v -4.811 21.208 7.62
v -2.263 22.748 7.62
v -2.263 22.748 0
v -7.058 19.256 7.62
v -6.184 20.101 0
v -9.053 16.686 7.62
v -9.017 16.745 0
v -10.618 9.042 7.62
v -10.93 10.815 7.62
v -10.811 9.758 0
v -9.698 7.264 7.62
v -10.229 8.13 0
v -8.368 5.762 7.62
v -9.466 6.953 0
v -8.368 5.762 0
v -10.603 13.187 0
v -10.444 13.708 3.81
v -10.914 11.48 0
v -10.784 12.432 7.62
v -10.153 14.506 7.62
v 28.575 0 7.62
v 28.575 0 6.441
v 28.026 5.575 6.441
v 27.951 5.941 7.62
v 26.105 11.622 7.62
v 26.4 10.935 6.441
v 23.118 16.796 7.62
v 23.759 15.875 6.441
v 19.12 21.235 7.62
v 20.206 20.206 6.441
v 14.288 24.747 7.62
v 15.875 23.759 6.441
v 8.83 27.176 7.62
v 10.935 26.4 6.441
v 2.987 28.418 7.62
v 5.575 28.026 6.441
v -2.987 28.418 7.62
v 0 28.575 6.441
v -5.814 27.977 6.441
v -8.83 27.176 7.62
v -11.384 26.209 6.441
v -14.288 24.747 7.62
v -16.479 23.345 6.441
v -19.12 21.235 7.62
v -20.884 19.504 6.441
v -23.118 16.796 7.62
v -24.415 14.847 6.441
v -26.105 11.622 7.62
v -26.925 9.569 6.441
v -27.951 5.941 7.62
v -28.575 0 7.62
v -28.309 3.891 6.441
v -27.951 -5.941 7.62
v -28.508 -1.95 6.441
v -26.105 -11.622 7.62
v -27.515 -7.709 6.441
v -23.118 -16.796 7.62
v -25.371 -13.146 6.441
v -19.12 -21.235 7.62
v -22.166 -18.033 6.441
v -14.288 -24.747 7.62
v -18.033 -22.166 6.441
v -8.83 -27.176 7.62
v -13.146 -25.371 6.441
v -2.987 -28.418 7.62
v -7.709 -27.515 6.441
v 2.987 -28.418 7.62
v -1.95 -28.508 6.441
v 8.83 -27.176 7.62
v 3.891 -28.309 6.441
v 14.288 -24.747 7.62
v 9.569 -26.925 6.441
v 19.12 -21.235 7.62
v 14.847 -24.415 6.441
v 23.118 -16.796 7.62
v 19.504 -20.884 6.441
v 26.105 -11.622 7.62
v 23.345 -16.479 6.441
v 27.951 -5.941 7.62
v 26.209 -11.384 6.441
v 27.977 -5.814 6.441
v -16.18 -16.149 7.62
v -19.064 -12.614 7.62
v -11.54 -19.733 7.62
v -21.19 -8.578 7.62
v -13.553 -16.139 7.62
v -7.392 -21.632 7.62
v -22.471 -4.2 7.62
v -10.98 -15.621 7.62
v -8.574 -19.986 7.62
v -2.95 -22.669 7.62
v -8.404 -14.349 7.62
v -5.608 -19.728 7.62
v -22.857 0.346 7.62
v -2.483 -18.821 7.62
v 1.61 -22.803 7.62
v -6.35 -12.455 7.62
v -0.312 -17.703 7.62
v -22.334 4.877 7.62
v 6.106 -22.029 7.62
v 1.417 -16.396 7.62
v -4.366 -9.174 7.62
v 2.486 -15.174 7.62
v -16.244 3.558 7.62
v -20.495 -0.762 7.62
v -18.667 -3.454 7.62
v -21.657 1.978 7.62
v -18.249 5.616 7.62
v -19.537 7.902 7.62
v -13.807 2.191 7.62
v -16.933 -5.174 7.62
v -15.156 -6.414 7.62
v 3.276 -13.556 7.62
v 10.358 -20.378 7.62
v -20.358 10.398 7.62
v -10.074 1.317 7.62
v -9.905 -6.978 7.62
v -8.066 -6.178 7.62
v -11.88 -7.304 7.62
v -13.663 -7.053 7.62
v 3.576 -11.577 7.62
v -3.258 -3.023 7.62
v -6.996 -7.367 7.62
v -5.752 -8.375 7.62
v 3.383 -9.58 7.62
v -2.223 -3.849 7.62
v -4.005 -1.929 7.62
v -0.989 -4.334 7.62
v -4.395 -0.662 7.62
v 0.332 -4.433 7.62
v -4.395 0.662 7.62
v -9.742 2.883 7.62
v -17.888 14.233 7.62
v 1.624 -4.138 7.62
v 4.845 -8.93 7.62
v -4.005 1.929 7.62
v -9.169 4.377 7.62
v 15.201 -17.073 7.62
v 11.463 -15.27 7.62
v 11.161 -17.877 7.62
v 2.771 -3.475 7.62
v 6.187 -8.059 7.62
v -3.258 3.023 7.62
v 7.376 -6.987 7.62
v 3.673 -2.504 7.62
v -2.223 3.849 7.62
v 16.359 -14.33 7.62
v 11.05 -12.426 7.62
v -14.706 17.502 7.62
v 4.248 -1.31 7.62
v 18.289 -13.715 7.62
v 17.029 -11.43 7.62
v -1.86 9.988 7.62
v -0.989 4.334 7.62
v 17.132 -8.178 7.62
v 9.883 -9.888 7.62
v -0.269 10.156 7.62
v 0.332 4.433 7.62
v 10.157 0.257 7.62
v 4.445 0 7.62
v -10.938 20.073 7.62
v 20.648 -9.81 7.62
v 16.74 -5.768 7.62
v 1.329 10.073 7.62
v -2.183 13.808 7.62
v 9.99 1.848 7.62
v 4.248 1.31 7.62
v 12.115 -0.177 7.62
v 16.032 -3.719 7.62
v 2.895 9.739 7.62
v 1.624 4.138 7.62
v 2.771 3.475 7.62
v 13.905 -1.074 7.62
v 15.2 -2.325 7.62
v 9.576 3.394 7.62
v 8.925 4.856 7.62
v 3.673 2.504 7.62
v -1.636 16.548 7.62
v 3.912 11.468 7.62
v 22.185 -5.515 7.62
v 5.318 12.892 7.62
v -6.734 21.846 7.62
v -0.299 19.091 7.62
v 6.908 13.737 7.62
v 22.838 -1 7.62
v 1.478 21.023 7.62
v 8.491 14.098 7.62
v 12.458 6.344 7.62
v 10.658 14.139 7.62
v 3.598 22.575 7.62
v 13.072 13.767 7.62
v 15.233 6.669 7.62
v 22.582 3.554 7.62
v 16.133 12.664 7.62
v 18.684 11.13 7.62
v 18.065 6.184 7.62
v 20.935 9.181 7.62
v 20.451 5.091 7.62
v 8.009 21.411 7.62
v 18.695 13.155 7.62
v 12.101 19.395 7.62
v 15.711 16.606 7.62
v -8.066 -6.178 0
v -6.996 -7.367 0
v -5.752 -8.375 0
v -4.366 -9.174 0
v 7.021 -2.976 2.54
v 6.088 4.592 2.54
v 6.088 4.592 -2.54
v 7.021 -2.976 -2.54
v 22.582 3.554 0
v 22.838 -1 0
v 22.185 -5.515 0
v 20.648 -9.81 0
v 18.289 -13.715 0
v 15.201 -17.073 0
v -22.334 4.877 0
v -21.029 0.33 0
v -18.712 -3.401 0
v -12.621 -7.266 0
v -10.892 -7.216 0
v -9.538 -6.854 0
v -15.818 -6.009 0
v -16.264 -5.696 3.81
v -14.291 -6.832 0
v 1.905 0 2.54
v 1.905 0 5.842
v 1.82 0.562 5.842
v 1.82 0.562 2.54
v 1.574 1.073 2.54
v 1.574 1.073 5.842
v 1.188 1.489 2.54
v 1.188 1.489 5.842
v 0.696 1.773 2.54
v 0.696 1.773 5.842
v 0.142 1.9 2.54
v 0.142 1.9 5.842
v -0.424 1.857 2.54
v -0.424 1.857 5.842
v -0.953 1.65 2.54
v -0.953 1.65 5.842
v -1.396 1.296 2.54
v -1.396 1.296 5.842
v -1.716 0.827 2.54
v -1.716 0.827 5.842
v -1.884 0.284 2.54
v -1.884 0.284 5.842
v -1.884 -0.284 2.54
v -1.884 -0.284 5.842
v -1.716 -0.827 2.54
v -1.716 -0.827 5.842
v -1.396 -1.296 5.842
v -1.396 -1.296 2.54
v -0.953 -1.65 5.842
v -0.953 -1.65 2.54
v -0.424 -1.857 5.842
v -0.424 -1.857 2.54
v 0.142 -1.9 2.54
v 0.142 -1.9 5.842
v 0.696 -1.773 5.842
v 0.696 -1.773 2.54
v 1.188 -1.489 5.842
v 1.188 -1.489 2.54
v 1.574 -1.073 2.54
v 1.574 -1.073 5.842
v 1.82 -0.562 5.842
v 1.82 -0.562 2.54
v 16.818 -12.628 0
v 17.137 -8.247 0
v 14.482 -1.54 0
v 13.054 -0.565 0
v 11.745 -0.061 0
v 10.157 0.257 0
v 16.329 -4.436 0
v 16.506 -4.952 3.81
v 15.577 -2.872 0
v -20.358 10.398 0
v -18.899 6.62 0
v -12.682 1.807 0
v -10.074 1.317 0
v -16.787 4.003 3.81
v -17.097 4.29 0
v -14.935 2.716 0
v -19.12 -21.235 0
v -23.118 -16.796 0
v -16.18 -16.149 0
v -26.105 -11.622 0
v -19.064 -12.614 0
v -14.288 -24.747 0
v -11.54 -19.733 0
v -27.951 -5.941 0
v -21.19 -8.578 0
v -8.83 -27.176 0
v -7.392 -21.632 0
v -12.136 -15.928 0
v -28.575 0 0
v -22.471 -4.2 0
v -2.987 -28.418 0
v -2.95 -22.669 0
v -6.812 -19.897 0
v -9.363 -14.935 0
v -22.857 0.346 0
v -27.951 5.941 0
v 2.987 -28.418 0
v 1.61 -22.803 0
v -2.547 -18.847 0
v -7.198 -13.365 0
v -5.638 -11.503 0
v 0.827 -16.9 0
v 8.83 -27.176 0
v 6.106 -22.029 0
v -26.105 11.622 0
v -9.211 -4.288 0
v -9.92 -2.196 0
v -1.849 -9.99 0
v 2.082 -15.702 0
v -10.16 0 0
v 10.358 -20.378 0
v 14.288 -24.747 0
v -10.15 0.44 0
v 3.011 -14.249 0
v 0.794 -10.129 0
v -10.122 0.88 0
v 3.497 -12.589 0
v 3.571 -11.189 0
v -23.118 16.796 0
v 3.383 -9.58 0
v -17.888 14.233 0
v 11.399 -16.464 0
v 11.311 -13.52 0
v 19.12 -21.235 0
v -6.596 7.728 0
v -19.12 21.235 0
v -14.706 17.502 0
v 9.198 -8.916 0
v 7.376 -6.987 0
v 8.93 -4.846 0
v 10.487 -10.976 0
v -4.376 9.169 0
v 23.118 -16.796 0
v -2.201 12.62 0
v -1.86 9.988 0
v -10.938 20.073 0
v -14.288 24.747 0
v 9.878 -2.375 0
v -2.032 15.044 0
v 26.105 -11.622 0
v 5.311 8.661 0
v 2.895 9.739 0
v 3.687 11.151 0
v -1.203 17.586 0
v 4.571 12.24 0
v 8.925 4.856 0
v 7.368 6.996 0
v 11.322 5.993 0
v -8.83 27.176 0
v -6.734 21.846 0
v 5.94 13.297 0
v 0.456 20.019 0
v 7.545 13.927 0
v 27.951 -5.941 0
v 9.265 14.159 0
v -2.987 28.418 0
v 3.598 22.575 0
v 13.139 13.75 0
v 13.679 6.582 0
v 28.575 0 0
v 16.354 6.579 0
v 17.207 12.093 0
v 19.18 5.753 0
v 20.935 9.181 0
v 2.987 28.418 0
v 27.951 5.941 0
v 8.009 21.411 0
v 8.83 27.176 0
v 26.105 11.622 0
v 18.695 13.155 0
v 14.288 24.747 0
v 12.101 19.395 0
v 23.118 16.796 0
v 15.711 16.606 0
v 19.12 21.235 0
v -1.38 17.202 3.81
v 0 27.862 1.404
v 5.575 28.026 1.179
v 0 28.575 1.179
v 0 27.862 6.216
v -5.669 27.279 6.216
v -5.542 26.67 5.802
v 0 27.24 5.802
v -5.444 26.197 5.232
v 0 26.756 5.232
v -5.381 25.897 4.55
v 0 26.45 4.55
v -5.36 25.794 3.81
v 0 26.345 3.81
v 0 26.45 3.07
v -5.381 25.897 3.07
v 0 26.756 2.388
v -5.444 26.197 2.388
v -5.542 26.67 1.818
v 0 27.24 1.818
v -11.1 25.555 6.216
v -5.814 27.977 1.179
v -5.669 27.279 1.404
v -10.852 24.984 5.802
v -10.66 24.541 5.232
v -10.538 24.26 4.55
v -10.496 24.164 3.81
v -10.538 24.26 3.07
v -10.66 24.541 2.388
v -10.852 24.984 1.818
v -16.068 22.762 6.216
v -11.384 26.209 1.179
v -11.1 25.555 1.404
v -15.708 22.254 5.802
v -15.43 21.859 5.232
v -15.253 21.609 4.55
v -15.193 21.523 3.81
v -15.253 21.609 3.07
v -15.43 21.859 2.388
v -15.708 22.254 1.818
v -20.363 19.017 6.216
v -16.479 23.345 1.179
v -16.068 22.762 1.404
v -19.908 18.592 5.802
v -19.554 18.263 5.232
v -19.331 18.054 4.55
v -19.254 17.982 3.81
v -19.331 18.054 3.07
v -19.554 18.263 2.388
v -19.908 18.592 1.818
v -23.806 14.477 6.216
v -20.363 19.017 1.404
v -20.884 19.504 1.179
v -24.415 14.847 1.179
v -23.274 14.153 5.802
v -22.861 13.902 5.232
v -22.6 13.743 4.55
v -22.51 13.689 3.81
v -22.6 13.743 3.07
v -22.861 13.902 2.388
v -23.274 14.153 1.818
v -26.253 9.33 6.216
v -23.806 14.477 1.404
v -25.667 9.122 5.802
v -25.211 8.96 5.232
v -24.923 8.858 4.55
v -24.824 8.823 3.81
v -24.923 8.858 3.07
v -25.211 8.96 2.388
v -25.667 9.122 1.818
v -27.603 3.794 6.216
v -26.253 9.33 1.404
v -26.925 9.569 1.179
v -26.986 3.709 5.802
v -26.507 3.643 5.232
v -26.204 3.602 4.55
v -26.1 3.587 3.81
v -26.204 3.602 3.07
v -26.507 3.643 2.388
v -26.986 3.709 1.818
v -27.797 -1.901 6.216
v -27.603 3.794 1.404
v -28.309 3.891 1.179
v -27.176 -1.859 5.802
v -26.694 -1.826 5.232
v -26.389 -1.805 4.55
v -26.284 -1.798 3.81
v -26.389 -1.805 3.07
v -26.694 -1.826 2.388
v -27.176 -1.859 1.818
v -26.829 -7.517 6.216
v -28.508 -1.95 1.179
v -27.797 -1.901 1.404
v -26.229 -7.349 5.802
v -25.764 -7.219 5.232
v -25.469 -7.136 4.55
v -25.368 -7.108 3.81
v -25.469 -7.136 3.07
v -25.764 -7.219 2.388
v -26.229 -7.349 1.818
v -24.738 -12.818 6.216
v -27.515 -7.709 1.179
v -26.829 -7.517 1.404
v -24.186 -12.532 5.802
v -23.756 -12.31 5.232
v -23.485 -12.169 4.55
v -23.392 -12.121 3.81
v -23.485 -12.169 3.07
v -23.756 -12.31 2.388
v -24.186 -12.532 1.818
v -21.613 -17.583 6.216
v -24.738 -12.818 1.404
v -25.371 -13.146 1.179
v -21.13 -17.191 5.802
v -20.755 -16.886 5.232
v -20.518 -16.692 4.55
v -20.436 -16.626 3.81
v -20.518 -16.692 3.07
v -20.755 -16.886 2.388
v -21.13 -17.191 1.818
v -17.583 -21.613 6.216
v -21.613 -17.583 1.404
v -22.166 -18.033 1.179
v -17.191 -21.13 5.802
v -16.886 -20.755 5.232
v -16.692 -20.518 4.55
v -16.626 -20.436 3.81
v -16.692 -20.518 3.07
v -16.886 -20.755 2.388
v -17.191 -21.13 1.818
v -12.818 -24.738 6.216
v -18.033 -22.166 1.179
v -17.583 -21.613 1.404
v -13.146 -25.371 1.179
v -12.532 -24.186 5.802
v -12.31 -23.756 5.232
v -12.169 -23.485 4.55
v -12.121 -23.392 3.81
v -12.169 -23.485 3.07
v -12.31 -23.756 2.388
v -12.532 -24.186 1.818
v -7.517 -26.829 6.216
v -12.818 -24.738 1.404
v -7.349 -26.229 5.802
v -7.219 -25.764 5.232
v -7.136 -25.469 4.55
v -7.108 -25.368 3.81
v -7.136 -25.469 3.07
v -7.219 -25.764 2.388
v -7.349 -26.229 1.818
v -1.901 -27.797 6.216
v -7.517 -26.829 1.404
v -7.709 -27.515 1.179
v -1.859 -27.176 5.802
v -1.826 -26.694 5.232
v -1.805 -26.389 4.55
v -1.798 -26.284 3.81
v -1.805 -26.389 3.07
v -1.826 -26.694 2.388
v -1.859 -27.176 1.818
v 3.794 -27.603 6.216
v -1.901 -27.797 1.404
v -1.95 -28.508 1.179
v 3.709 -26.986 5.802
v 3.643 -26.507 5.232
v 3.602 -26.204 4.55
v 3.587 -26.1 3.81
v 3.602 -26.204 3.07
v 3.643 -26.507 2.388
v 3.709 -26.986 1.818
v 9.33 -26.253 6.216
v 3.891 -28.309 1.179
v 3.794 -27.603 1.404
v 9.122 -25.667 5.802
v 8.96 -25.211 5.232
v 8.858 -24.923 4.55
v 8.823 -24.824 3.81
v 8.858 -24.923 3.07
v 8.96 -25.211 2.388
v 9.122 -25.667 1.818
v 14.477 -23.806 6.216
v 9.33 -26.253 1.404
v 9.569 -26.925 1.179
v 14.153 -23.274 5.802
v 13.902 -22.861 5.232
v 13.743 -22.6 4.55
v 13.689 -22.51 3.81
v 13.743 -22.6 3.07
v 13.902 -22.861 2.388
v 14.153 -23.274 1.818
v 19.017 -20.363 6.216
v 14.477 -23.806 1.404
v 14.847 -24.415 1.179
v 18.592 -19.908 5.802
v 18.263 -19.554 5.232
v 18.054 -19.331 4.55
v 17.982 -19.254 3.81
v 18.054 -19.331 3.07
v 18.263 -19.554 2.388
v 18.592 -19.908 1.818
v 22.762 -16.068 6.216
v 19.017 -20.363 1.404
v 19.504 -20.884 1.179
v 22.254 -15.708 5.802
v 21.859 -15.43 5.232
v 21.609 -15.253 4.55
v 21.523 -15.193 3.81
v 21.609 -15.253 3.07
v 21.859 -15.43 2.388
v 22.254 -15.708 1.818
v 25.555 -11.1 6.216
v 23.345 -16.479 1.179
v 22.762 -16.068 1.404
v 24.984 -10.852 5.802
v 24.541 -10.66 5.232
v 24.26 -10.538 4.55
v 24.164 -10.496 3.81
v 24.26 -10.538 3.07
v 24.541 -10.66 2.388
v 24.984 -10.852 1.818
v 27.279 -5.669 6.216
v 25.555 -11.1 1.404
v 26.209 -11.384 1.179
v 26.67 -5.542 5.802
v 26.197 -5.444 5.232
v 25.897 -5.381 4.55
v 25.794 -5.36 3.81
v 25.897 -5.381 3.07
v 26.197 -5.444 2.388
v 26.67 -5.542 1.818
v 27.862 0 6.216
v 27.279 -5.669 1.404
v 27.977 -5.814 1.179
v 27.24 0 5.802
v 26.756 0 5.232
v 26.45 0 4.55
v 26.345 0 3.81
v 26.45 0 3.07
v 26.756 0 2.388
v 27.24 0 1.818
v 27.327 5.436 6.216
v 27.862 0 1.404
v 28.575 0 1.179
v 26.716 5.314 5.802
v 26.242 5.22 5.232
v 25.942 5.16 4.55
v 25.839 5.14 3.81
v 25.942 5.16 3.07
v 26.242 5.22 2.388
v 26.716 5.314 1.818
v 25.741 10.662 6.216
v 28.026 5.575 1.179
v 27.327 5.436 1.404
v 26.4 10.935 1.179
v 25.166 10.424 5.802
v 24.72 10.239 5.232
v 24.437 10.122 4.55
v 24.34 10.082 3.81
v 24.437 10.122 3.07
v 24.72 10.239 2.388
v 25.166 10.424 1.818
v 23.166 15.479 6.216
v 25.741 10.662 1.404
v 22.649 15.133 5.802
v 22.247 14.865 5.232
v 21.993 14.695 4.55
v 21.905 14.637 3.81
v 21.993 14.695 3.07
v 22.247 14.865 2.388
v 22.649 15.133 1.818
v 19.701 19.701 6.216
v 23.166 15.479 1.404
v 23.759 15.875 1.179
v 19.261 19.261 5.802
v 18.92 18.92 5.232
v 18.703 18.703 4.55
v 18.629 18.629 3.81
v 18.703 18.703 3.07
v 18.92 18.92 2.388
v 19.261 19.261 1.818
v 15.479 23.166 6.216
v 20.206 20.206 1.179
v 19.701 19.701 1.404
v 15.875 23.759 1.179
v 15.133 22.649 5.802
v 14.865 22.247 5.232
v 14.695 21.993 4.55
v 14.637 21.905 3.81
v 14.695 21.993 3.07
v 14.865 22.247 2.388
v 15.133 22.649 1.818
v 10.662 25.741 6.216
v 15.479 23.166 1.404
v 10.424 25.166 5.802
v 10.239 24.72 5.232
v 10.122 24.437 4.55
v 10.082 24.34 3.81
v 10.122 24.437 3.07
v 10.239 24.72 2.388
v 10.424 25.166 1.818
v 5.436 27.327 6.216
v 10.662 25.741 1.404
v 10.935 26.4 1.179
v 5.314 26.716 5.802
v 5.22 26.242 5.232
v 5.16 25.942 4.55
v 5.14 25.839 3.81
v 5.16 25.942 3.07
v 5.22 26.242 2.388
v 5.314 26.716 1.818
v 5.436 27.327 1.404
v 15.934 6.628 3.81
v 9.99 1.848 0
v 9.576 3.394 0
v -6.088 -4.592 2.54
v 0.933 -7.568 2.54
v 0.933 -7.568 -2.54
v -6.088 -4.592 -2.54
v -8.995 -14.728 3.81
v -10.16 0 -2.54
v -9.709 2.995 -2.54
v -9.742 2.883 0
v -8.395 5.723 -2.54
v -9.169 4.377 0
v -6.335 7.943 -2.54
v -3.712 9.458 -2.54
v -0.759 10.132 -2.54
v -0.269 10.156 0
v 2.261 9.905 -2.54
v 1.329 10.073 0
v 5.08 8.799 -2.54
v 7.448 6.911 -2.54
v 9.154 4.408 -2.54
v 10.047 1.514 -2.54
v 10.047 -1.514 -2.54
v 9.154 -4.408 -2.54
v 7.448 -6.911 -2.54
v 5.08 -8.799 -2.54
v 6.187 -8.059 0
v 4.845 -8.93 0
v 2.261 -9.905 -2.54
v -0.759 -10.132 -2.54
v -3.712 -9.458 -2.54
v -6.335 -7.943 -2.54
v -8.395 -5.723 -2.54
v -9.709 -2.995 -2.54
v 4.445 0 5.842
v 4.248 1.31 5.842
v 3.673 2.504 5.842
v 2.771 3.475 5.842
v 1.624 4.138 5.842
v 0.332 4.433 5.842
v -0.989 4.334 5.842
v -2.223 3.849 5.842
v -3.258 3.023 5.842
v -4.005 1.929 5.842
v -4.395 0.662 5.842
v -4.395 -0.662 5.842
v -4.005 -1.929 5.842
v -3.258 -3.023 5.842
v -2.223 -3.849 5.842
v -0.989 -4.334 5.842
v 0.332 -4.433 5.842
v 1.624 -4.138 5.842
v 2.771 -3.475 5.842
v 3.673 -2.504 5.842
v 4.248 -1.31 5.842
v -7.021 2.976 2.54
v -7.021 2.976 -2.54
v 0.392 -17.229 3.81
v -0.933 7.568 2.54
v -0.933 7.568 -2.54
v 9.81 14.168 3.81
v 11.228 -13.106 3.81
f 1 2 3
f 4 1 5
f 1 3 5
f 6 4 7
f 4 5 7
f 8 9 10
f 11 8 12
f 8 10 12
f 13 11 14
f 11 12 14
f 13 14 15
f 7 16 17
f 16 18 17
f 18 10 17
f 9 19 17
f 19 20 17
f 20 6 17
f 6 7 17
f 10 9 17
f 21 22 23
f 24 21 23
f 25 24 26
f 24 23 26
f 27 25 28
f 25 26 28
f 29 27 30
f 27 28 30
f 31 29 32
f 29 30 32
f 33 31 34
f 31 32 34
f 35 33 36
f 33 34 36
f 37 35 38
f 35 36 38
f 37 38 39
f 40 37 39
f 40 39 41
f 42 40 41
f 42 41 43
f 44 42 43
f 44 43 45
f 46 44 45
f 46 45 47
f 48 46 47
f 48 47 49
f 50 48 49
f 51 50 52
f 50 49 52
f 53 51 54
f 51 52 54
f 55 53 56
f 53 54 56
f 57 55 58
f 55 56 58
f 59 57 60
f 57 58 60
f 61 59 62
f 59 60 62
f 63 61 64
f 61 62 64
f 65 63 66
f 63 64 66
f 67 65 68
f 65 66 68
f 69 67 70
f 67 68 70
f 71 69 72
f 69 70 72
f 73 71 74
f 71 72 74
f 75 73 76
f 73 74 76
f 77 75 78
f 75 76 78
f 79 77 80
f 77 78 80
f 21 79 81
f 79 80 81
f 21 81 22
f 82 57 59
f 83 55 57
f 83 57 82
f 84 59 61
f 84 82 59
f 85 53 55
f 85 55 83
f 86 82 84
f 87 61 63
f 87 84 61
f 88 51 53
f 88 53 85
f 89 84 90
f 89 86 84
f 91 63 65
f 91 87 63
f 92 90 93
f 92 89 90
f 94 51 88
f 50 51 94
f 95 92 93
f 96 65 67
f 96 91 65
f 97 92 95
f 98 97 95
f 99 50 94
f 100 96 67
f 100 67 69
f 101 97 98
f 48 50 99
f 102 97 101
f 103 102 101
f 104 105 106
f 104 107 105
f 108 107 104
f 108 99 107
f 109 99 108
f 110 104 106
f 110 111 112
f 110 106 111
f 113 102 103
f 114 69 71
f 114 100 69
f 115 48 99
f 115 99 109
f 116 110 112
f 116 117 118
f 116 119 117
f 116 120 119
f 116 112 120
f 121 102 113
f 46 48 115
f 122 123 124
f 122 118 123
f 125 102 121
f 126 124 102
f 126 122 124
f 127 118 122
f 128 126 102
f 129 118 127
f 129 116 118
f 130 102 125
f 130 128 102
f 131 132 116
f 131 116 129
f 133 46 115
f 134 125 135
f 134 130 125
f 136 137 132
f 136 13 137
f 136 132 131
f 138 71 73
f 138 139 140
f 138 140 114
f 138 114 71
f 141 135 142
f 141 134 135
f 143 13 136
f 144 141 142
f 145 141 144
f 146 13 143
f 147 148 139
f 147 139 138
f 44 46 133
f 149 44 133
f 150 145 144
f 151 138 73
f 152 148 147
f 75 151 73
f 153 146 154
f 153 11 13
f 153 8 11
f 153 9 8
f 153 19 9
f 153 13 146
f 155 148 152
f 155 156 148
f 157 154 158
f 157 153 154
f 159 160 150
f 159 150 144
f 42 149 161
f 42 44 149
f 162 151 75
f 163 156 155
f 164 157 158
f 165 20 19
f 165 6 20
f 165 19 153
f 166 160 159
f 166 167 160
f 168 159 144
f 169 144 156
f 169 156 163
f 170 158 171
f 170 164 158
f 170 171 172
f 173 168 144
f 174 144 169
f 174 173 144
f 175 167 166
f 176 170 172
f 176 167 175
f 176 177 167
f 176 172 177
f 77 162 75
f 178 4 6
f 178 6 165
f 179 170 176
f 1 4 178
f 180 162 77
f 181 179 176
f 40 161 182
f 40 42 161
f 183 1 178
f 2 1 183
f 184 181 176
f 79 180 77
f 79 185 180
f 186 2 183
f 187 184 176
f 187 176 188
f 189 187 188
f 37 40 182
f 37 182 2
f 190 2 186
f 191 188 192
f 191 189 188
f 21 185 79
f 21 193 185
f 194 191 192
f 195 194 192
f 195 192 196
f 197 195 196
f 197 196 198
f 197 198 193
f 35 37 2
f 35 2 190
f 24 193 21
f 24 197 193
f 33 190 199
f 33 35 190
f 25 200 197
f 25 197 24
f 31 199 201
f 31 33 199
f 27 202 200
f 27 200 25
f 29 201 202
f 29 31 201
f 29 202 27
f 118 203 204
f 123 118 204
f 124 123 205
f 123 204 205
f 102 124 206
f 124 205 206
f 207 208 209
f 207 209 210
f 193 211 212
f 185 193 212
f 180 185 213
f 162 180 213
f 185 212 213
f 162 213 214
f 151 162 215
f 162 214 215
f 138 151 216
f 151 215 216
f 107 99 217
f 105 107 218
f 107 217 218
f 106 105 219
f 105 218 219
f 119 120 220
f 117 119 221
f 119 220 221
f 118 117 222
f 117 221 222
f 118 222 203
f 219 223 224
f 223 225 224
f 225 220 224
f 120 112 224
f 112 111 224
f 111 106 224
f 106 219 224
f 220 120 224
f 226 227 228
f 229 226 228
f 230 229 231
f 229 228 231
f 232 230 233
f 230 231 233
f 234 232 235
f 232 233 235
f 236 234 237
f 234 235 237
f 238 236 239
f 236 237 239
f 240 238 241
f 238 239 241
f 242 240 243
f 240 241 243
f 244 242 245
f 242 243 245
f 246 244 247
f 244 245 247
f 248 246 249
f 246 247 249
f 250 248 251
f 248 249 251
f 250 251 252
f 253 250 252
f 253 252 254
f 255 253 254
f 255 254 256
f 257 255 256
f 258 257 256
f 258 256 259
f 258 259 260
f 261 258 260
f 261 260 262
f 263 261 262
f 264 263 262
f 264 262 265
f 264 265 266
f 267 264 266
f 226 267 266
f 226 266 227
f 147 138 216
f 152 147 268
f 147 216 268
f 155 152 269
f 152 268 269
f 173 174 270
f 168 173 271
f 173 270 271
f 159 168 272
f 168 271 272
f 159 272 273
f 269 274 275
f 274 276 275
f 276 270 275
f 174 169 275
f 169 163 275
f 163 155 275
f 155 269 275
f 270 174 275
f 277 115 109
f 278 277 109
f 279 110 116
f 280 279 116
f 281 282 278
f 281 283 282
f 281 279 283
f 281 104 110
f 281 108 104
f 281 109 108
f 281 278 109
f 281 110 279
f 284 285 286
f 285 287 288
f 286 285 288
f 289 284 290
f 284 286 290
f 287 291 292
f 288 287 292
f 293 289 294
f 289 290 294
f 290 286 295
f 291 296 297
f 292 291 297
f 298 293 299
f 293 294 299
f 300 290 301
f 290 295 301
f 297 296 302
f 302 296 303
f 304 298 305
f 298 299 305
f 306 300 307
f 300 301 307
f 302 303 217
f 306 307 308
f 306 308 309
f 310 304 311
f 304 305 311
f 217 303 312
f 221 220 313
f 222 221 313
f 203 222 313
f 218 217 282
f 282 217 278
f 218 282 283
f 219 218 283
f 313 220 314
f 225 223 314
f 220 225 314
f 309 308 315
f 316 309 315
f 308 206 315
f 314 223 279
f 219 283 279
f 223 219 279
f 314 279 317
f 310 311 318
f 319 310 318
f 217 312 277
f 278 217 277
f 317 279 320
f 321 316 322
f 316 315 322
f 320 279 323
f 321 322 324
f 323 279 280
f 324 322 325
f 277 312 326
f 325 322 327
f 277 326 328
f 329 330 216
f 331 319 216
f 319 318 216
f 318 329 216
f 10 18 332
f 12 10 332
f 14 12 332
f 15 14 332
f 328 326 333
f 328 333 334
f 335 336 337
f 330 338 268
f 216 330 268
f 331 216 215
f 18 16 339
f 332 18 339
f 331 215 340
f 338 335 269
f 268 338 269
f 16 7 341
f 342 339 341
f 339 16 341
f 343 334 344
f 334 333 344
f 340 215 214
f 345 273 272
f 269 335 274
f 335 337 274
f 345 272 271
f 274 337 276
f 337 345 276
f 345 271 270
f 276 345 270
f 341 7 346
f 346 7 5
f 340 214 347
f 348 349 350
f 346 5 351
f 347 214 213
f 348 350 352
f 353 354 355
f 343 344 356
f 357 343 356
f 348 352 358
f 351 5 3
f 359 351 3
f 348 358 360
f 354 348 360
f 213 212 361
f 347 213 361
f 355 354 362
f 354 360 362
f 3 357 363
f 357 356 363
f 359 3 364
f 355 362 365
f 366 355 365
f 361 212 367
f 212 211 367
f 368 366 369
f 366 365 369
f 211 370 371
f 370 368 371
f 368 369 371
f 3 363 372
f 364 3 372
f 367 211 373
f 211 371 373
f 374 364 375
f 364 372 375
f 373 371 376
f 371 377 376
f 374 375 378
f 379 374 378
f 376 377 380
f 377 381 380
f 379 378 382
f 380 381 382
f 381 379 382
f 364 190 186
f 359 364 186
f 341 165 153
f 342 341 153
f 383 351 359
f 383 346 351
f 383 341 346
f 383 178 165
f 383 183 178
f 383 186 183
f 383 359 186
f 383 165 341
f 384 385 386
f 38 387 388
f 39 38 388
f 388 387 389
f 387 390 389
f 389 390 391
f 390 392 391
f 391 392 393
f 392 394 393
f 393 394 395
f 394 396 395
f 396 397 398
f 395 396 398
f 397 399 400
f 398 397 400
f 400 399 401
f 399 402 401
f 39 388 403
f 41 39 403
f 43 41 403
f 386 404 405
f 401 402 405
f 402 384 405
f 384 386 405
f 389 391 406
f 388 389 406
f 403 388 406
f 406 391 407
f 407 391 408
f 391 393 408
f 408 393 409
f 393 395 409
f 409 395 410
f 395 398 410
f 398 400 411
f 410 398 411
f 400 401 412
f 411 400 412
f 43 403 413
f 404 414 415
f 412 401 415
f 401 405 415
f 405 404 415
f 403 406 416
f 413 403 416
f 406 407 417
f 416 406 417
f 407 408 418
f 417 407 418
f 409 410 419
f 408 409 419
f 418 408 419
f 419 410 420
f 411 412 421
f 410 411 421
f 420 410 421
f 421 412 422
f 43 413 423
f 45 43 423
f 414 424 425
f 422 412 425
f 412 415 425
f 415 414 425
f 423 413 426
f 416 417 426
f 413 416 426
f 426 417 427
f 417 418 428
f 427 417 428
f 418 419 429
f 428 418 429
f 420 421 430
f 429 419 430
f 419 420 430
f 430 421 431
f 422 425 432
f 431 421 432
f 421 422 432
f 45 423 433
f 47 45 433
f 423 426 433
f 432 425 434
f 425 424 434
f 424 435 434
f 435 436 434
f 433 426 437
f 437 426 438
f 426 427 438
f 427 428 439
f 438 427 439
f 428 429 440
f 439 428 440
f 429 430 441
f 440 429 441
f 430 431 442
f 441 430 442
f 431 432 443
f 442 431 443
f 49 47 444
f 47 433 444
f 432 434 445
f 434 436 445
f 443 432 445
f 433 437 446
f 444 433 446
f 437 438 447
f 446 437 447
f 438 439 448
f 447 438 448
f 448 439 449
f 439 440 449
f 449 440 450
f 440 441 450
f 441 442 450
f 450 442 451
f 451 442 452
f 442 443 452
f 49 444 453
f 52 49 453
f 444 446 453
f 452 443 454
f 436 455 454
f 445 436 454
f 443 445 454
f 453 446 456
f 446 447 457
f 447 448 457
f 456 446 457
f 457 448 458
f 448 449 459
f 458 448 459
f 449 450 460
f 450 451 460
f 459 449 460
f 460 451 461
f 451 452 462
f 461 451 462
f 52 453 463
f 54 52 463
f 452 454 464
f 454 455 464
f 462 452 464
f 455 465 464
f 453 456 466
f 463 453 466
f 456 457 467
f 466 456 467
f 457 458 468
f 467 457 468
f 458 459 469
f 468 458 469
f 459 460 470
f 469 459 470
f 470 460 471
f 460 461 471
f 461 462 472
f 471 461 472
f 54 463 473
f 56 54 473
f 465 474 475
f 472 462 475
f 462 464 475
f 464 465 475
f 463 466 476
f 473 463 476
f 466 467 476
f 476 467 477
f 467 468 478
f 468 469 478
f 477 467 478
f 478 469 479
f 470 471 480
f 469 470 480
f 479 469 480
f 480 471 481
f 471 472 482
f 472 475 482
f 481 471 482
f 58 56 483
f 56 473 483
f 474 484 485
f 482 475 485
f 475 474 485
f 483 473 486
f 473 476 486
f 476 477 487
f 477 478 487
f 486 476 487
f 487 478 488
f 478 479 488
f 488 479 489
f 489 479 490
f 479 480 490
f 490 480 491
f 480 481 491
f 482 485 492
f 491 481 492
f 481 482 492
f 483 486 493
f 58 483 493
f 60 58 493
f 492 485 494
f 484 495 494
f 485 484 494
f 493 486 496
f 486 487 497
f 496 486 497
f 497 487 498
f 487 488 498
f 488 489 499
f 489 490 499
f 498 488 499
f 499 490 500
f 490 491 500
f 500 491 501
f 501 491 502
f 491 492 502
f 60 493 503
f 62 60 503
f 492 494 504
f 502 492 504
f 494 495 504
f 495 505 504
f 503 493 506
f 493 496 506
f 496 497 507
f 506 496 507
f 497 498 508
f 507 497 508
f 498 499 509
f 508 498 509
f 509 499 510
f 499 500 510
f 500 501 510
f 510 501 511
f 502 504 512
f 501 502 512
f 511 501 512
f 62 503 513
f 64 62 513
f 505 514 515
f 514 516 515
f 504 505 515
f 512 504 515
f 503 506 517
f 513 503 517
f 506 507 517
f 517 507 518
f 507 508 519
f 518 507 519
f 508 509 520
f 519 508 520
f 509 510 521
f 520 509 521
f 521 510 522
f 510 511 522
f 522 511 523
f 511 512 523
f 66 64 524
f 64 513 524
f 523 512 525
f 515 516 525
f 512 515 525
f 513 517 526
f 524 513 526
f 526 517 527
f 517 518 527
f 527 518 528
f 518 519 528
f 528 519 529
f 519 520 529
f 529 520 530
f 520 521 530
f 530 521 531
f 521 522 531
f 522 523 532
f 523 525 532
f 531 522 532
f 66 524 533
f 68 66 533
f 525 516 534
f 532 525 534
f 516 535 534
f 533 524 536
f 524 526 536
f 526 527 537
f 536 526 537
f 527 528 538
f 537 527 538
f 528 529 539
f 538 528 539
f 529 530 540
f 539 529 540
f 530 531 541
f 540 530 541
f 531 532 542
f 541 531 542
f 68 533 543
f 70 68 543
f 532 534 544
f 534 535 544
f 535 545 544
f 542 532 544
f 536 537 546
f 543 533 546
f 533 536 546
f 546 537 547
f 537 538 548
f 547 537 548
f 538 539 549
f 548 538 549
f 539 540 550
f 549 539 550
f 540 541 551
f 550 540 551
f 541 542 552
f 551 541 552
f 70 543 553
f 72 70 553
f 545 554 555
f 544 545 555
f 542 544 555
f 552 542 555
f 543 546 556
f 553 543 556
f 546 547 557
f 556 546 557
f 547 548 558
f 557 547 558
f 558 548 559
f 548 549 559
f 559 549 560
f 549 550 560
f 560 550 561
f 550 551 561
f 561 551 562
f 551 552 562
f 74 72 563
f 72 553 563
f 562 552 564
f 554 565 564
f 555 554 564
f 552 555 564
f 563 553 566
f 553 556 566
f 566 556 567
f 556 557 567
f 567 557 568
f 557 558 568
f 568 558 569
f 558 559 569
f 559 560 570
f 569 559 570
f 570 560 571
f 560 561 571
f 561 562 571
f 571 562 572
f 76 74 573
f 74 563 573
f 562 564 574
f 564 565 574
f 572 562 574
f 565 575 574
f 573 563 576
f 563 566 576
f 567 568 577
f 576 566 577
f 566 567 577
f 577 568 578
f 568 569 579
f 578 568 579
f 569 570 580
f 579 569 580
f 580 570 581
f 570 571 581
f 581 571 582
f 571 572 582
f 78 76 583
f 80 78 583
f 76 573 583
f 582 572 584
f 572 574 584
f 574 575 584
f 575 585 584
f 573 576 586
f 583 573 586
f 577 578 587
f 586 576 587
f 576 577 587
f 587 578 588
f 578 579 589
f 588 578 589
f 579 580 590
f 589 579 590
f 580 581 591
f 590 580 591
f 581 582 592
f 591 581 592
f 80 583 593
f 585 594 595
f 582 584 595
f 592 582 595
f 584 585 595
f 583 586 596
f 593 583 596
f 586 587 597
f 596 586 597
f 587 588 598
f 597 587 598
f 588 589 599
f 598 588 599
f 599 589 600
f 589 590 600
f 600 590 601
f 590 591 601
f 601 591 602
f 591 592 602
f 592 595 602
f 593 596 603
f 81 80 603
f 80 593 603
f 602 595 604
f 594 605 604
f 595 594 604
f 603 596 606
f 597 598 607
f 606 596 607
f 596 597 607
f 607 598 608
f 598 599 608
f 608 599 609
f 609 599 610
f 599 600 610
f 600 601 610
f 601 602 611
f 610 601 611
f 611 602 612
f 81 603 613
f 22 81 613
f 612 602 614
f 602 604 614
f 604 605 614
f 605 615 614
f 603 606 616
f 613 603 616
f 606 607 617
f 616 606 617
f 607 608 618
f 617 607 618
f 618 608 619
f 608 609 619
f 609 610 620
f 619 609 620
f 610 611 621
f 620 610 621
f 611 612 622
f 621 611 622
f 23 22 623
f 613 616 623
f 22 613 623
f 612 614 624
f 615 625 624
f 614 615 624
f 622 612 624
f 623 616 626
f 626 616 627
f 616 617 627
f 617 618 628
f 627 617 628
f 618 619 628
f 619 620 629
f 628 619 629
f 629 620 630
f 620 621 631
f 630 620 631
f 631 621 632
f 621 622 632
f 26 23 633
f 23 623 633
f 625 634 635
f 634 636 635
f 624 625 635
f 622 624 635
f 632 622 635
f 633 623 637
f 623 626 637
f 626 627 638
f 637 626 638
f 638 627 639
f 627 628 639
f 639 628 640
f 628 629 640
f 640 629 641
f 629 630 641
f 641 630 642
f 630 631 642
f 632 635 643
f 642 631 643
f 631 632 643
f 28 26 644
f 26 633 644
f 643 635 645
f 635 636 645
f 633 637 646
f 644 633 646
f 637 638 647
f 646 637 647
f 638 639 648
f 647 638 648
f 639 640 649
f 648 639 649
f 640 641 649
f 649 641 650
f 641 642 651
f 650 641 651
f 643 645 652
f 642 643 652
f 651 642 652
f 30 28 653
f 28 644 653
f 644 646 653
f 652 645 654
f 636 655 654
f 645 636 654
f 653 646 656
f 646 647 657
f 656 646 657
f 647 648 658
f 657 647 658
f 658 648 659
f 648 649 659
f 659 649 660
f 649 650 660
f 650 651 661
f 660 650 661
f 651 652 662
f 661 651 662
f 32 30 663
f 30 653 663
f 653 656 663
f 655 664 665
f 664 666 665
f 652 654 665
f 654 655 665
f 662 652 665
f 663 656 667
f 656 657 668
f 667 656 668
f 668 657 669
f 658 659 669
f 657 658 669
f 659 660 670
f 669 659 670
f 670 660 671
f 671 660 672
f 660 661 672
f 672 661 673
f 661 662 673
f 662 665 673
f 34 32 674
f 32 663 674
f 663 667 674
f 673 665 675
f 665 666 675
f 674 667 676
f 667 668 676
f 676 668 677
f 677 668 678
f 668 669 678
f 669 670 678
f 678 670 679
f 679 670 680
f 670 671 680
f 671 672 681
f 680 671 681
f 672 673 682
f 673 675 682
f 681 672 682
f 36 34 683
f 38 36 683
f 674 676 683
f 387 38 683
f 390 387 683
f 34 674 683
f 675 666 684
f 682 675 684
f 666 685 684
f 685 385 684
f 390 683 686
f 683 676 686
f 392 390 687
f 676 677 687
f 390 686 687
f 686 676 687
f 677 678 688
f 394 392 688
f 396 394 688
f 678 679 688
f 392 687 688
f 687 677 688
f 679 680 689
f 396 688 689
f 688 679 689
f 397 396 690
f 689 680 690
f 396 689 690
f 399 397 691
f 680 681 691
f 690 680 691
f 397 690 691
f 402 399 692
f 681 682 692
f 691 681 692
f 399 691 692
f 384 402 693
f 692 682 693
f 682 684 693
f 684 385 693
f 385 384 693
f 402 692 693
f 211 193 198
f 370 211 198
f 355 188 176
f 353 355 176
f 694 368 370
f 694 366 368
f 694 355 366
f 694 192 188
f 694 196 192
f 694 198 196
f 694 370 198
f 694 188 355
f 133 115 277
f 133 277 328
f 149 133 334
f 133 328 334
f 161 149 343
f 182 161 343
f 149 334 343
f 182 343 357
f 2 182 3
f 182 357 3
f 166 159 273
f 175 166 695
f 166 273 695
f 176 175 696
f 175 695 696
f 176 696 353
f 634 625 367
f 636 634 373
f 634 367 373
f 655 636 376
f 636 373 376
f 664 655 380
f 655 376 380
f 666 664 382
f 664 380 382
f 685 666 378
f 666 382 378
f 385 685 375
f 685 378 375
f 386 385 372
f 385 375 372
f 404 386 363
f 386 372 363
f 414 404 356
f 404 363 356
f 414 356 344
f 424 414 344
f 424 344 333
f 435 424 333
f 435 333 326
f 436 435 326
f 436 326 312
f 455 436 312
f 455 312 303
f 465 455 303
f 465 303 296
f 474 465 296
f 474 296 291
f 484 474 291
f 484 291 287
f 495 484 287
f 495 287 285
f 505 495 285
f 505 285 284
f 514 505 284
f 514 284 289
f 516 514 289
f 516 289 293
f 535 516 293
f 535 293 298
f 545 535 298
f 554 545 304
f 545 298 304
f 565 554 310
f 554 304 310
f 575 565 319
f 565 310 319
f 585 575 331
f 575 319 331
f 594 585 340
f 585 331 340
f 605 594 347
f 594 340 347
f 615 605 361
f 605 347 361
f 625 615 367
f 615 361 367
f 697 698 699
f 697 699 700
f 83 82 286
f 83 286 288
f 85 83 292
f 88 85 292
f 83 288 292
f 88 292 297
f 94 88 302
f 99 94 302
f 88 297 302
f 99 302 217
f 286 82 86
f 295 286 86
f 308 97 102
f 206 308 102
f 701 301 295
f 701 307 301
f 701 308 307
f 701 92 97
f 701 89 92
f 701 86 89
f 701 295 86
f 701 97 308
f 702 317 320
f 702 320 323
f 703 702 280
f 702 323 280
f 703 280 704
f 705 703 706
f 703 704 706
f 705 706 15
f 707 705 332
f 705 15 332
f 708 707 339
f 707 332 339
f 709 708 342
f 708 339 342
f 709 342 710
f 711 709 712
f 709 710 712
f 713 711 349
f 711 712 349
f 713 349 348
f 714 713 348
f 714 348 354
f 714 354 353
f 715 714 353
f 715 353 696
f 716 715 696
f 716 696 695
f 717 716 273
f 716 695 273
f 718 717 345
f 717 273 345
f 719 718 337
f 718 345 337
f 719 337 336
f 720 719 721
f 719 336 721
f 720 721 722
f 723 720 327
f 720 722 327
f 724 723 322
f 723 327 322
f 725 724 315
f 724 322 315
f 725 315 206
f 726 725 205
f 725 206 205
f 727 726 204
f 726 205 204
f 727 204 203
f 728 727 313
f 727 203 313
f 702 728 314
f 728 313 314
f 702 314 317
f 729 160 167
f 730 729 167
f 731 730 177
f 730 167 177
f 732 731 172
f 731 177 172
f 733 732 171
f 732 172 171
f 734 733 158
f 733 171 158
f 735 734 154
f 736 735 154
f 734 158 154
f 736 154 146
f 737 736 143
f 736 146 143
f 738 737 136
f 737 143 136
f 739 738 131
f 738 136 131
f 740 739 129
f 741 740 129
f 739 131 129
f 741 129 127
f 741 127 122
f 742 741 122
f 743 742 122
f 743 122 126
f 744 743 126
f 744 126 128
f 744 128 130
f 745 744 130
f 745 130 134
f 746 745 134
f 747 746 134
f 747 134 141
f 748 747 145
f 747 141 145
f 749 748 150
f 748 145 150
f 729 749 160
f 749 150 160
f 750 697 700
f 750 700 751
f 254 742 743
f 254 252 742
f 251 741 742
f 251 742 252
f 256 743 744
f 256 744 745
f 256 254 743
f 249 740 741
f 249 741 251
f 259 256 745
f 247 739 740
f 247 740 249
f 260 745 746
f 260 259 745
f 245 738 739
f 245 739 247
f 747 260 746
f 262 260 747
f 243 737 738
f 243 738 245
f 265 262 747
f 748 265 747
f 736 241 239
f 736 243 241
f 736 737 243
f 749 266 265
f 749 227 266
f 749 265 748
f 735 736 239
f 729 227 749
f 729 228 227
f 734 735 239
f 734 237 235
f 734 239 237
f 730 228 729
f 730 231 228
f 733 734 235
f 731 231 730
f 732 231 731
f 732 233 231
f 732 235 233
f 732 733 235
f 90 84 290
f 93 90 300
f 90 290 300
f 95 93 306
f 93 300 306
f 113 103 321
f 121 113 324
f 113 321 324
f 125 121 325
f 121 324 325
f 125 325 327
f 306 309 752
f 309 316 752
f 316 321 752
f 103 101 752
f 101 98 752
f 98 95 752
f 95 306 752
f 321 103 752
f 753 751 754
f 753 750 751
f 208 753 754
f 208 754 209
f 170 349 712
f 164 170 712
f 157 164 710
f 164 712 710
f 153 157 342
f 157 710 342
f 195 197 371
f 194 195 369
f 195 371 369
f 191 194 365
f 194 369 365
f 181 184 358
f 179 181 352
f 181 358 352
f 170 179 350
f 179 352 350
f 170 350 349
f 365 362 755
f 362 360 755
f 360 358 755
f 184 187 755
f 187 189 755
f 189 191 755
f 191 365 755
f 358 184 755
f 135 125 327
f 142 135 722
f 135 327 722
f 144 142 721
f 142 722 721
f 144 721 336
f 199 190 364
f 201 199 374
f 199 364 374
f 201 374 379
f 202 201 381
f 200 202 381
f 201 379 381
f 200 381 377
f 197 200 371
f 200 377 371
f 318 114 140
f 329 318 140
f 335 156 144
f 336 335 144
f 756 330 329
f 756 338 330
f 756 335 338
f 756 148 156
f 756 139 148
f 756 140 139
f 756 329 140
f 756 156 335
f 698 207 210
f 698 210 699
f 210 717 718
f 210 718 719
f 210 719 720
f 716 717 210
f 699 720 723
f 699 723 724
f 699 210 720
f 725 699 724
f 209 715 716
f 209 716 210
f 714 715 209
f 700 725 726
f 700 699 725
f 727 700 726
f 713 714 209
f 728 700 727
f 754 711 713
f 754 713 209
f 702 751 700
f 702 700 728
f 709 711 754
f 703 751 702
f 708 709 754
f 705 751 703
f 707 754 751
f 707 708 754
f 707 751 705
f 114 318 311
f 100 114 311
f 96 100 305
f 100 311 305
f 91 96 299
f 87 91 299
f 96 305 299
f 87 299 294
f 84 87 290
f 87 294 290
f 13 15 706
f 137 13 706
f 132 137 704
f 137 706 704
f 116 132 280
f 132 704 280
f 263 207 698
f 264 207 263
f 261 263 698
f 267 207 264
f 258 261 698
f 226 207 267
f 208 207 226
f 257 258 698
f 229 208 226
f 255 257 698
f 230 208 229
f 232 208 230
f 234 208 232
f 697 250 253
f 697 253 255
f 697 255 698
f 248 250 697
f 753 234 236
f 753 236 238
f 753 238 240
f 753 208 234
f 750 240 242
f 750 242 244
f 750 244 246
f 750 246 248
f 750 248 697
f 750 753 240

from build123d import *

# Parameters (mm, degrees)
SKETCH1_R               = 28.575
BOSS_EXTRUDE1_DEPTH     = 7.62
SKETCH3_R               = 2.667
SKETCH5_R               = 10.16
BOSS_EXTRUDE3_DEPTH     = 2.54
CUT_EXTRUDE1_DEPTH      = 2.54
CUT_EXTRUDE1_DEPTH_BACK = 2.54
SKETCH6_R               = 1.905
CUT_EXTRUDE2_DEPTH      = 11.16
CUT_EXTRUDE3_DEPTH      = 8.62
SKETCH8_R               = 4.445
CUT_EXTRUDE4_DEPTH      = 1.778


with BuildPart() as part:
    # Sketch1 → Boss-Extrude1 (new body)
    with BuildSketch(Plane.XY):
        Circle(SKETCH1_R)
    extrude(amount=BOSS_EXTRUDE1_DEPTH)

    # Sketch3 → Cut-Revolve1 (revolve, cut)
    with BuildSketch(Plane(origin=(0, 0, 0), x_dir=(0, 0, -1), z_dir=(1, 0, 0))):
        with Locations((-3.81, 29.012456481)):
            Circle(SKETCH3_R)
    revolve(axis=Axis((0, 0, 0), (0, 0, 1)), mode=Mode.SUBTRACT)

    # Sketch5 → Boss-Extrude3 (add)
    with BuildSketch(Plane(origin=(0, 0, 0), x_dir=(-1, 0, 0), z_dir=(0, 0, -1))):
        Circle(SKETCH5_R)
    extrude(amount=BOSS_EXTRUDE3_DEPTH)

    # Sketch4 → Cut-Extrude1 (cut, two sides)
    with BuildSketch(Plane(origin=(0, 0, 0), x_dir=(-1, 0, 0), z_dir=(0, 0, -1))) as cut_extrude1_sk:
        Polygon((7.020938099, 2.976045958), (0.933137647, 7.568333731), (-6.087800452, 4.592287773), (-7.020938099, -2.976045958), (-0.933137647, -7.568333731), (6.087800452, -4.592287773), align=None)
    extrude(amount=CUT_EXTRUDE1_DEPTH, mode=Mode.SUBTRACT)
    extrude(cut_extrude1_sk.sketch, amount=-CUT_EXTRUDE1_DEPTH_BACK, mode=Mode.SUBTRACT)

    # Sketch6 → Cut-Extrude2 (cut, through all)
    with BuildSketch(Plane.XY.offset(7.62)):
        Circle(SKETCH6_R)
    extrude(amount=-CUT_EXTRUDE2_DEPTH, mode=Mode.SUBTRACT)

    # Sketch7 → Cut-Extrude3 (cut, through all)
    with BuildSketch(Plane(origin=(0, 0, 0), x_dir=(-1, 0, 0), z_dir=(0, 0, -1))):
        with BuildLine():
            ThreePointArc((20.358331305, 10.397977999), (12.886311534, 18.881805397), (2.2627084, 22.747741661))
            add(Edge.make_bspline(
                [(2.2627084, 22.747741661), (6.405747391, 20.68512775), (11.177081783, 15.102097432), (11.330348043, 8.533524003), (8.367773099, 5.762462439)],
                knots=[0, 0, 0, 0, 0.593726926, 1, 1, 1, 1], degree=3))
            ThreePointArc((8.367773099, 5.762462439), (9.485052986, 3.641341765), (10.074217449, 1.317475913))
            add(Edge.make_bspline(
                [(20.358331305, 10.397977999), (18.357588554, 2.14920895), (10.074217449, 1.317475913)],
                knots=[0, 0, 0, 1, 1, 1], degree=2))
        make_face()
        with BuildLine():
            ThreePointArc((16.180135083, -16.14877174), (21.939753321, -6.420811804), (22.333603287, 4.877475189))
            add(Edge.make_bspline(
                [(22.333603287, 4.877475189), (21.652210342, 0.299828208), (17.81685639, -5.963231706), (11.617133708, -8.1387974), (8.066211545, -6.17752631)],
                knots=[0, 0, 0, 0, 0.593726926, 1, 1, 1, 1], degree=3))
            ThreePointArc((8.066211545, -6.17752631), (6.394164379, -7.895584962), (4.366098449, -9.174027705))
            add(Edge.make_bspline(
                [(16.180135083, -16.14877174), (7.716826016, -16.794962128), (4.366098449, -9.174027705)],
                knots=[0, 0, 0, 1, 1, 1], degree=2))
        make_face()
        with BuildLine():
            ThreePointArc((-10.358457881, -20.378467811), (0.673201723, -22.850085327), (11.540217523, -19.733296216))
            add(Edge.make_bspline(
                [(11.540217523, -19.733296216), (6.976054533, -20.499823727), (-0.165658961, -18.787577309), (-4.15056456, -13.563577423), (-3.382580204, -9.580383665)],
                knots=[0, 0, 0, 0, 0.593726926, 1, 1, 1, 1], degree=3))
            ThreePointArc((-3.382580204, -9.580383665), (-5.533242071, -8.521081633), (-7.37582021, -6.987336849))
            add(Edge.make_bspline(
                [(-10.358457881, -20.378467811), (-13.588327791, -12.529066385), (-7.37582021, -6.987336849)],
                knots=[0, 0, 0, 1, 1, 1], degree=2))
        make_face()
        with BuildLine():
            ThreePointArc((-22.582014125, 3.554185994), (-21.523691775, -7.701317574), (-15.201356621, -17.07332296))
            add(Edge.make_bspline(
                [(-15.201356621, -17.07332296), (-17.340771534, -12.969416034), (-17.919239259, -5.648129637), (-14.182323678, -0.243954457), (-10.156761081, 0.25652358)],
                knots=[0, 0, 0, 0, 0.593726926, 1, 1, 1, 1], degree=3))
            ThreePointArc((-10.156761081, 0.25652358), (-9.813896046, 2.629266893), (-8.924606034, 4.855616042))
            add(Edge.make_bspline(
                [(-22.582014125, 3.554185994), (-16.114874441, 9.051573254), (-8.924606034, 4.855616042)],
                knots=[0, 0, 0, 1, 1, 1], degree=2))
        make_face()
        with BuildLine():
            ThreePointArc((-3.597994382, 22.575075557), (-13.975574803, 18.090409308), (-20.935172589, 9.181402325))
            add(Edge.make_bspline(
                [(-20.935172589, 9.181402325), (-17.693240732, 12.484283803), (-10.909039954, 15.29684122), (-4.614593512, 13.412805277), (-2.89464336, 9.738923956)],
                knots=[0, 0, 0, 0, 0.593726926, 1, 1, 1, 1], degree=3))
            ThreePointArc((-2.89464336, 9.738923956), (-0.532079248, 10.146057938), (1.860110345, 9.988272599))
            add(Edge.make_bspline(
                [(-3.597994382, 22.575075557), (3.628787662, 18.123246308), (1.860110345, 9.988272599)],
                knots=[0, 0, 0, 1, 1, 1], degree=2))
        make_face()
    extrude(amount=-CUT_EXTRUDE3_DEPTH, mode=Mode.SUBTRACT)

    # Sketch8 → Cut-Extrude4 (cut)
    with BuildSketch(Plane.XY.offset(7.62)):
        Circle(SKETCH8_R)
    extrude(amount=-CUT_EXTRUDE4_DEPTH, mode=Mode.SUBTRACT)


solid = part.part
